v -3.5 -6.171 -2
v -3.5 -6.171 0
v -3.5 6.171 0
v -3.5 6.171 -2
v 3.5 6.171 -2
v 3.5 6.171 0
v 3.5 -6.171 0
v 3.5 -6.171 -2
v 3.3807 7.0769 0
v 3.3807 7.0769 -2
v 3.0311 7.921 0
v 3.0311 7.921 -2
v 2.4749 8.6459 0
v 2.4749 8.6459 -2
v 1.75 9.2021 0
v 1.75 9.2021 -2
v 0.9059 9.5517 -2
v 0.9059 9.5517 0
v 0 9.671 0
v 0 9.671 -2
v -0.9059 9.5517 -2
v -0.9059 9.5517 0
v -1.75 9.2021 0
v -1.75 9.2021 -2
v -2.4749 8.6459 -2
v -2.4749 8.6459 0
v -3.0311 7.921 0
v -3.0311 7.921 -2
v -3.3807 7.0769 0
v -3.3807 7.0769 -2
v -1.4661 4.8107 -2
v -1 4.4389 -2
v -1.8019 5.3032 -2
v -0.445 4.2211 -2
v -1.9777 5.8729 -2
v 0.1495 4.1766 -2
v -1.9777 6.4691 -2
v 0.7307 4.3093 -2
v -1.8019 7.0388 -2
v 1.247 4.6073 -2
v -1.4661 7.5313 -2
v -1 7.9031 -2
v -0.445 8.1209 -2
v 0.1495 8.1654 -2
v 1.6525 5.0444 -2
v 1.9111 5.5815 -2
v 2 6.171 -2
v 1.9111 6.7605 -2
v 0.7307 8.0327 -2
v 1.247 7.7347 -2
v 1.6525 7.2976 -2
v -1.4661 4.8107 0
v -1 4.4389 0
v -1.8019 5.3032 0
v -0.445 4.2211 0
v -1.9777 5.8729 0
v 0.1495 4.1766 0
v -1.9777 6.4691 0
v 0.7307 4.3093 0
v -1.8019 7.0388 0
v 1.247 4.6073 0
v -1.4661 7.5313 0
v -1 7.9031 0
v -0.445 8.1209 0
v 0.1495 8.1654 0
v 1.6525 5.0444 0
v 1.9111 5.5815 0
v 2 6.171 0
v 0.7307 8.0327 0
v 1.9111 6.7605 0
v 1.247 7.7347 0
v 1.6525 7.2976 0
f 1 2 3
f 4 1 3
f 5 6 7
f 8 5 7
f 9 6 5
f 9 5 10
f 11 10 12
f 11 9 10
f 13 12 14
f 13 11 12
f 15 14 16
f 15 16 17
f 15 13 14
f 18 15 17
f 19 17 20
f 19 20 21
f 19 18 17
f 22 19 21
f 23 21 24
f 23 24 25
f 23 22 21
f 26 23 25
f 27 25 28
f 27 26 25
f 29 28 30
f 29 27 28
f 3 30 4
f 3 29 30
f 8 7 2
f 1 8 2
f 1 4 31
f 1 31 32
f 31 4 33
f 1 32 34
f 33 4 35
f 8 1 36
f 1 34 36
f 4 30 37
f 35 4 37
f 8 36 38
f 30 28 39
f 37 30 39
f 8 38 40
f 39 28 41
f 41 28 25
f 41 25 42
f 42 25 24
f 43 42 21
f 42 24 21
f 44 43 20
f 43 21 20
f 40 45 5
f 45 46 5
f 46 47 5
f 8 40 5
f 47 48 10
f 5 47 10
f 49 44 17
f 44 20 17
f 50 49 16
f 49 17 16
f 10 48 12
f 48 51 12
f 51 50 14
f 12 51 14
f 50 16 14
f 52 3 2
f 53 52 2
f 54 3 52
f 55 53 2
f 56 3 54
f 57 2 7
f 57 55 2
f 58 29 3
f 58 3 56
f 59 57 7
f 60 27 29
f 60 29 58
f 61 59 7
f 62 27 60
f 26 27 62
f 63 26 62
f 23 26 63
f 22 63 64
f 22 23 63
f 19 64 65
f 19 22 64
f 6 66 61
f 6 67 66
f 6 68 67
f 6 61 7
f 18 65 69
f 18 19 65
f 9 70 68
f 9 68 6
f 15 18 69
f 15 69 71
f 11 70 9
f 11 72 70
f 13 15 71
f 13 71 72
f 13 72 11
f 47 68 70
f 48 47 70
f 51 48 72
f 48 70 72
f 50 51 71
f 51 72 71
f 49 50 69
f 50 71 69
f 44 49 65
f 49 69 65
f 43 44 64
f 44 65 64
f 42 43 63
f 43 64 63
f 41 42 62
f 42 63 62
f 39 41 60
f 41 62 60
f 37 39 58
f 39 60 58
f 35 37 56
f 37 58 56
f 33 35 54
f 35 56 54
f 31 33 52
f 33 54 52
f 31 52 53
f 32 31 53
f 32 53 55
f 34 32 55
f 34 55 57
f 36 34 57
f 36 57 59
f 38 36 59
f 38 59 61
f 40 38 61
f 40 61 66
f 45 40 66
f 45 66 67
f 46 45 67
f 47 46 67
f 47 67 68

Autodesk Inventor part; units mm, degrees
ref_plane "YZ Plane" through (0, 0, 0) normal (1, 0, 0) x (0, 1, 0)
ref_plane "XZ Plane" through (0, 0, 0) normal (0, 1, 0) x (-1, 0, 0)
ref_plane "XY Plane" through (0, 0, 0) normal (0, 0, 1) x (1, 0, 0)
sketch "Skizze1" plane through (0, 0, 0) normal (0, 0, 1) x (1, 0, 0)
  line L0 (3.5, 6.171) -> (3.5, -6.171)
  line L1 (3.5, -6.171) -> (-3.5, -6.171)
  line L2 (-3.5, -6.171) -> (-3.5, 6.171)
  arc A0 (3.5, 6.171) -> (-3.5, 6.171) centre (0, 6.171) ccw
  circle A1 centre (0, 6.171) radius 2
  point P0 (0, 0)
  point P1 (-3.5, 0)
extrude "Extrusion1" add sketch "Skizze1" against normal blind 2
properties part number "planetenstab"
